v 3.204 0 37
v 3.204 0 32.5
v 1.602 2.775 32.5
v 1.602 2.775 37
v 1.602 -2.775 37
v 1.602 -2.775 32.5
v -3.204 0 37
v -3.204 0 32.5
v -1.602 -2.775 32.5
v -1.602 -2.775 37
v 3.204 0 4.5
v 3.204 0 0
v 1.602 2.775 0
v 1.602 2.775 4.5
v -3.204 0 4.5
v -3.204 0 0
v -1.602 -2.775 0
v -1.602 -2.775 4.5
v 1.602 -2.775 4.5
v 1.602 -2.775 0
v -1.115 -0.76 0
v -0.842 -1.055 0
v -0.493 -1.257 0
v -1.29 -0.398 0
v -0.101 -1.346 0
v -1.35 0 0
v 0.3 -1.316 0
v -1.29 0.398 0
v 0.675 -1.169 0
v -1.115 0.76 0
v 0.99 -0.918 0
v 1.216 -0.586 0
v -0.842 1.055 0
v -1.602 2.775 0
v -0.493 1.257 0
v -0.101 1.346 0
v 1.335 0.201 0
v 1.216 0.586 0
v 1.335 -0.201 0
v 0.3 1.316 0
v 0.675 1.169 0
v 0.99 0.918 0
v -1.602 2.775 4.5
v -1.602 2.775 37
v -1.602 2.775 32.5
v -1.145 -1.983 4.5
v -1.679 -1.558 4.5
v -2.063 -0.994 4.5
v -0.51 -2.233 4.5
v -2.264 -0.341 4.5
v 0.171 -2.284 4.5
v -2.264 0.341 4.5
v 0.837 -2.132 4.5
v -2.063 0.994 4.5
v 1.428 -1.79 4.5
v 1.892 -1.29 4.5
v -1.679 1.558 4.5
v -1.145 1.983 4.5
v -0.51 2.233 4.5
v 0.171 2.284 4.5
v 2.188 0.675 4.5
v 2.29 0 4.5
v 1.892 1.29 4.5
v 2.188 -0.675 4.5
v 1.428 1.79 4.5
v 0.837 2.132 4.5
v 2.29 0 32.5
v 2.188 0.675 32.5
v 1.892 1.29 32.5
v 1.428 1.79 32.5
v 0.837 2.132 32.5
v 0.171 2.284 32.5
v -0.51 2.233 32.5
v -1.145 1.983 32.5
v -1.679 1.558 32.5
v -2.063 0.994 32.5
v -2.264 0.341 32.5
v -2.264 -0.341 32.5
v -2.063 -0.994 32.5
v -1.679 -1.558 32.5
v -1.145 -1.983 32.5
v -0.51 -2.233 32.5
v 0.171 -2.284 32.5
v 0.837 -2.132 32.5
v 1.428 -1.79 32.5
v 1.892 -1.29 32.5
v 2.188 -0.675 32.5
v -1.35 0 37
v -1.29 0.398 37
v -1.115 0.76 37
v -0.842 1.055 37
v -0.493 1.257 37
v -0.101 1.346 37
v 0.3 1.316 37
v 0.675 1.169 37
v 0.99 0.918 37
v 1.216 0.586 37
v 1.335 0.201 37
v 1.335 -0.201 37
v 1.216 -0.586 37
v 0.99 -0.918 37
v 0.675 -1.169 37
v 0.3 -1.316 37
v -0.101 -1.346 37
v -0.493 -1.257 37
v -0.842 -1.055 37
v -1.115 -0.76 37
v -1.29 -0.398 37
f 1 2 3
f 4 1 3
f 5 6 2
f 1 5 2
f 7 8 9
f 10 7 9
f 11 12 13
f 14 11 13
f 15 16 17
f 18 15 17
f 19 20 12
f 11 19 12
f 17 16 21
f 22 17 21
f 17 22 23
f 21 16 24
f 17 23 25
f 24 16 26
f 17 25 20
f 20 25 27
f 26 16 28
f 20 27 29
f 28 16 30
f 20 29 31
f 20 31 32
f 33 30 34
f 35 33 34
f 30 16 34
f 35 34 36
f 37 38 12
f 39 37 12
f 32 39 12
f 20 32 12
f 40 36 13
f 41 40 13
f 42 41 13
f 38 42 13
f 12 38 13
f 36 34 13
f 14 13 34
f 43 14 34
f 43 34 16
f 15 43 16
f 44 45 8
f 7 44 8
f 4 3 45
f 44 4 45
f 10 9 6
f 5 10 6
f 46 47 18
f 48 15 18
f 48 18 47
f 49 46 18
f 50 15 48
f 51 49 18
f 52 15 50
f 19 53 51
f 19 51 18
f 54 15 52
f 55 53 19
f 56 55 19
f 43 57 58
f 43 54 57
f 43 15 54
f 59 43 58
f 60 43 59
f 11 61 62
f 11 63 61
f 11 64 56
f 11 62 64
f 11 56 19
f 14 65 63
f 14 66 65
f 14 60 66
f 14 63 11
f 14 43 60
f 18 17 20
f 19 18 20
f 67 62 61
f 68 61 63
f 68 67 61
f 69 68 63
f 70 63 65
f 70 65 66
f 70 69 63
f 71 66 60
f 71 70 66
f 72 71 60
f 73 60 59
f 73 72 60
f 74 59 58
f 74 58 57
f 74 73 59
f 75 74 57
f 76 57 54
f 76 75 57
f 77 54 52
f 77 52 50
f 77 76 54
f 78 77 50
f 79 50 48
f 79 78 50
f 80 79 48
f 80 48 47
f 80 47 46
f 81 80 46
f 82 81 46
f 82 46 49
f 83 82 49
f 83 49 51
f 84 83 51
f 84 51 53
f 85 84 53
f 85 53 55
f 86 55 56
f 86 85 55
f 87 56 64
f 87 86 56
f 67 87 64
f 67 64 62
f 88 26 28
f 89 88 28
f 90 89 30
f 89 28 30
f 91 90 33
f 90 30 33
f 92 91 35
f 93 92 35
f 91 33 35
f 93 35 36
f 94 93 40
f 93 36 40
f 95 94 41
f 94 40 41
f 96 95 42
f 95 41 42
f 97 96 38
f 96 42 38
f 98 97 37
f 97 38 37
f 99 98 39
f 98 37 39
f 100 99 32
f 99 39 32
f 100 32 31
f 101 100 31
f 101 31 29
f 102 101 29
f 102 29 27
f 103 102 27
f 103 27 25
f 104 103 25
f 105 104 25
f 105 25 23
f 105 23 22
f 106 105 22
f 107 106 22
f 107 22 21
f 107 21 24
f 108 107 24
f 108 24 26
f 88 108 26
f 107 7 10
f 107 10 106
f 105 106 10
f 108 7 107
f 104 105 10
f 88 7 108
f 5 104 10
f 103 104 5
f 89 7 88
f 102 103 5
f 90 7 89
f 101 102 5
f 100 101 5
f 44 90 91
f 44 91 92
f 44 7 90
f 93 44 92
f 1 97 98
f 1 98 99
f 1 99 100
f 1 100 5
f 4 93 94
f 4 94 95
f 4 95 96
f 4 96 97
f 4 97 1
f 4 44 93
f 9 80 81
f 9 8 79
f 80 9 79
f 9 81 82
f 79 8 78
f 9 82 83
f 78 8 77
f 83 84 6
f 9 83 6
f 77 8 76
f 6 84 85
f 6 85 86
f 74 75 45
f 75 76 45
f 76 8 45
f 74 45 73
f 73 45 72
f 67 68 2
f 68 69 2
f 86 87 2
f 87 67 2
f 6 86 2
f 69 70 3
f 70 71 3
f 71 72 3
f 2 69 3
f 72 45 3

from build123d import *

# Parameters (mm, degrees)
Y_KSEKLIK_EKSTR_ZYON1_DEPTH = 37
KES_EKSTR_ZYON1_START       = -4.5
IZIM2_R                     = 3.29
IZIM2_R_2                   = 2.29
KES_EKSTR_ZYON1_DEPTH       = 28
IZIM3_R                     = 1.35
KES_EKSTR_ZYON2_DEPTH       = 38.242020958


with BuildPart() as part:
    # Çizim1 → Yükseklik-Ekstrüzyon1 (new body)
    with BuildSketch(Plane.XY):
        Polygon((1.602146997, -2.775), (3.204293994, 0), (1.602146997, 2.775), (-1.602146997, 2.775), (-3.204293994, 0), (-1.602146997, -2.775), align=None)
    extrude(amount=Y_KSEKLIK_EKSTR_ZYON1_DEPTH)

    # Çizim2 → Kes-Ekstrüzyon1 (cut)
    with BuildSketch(Plane.XY.offset(37).offset(KES_EKSTR_ZYON1_START)):
        Circle(IZIM2_R)
        Circle(IZIM2_R_2, mode=Mode.SUBTRACT)
    extrude(amount=-KES_EKSTR_ZYON1_DEPTH, mode=Mode.SUBTRACT)

    # Çizim3 → Kes-Ekstrüzyon2 (cut, through all)
    with BuildSketch(Plane(origin=(0, 0, 0), x_dir=(-1, 0, 0), z_dir=(0, 0, -1))):
        Circle(IZIM3_R)
    extrude(amount=-KES_EKSTR_ZYON2_DEPTH, mode=Mode.SUBTRACT)


solid = part.part
